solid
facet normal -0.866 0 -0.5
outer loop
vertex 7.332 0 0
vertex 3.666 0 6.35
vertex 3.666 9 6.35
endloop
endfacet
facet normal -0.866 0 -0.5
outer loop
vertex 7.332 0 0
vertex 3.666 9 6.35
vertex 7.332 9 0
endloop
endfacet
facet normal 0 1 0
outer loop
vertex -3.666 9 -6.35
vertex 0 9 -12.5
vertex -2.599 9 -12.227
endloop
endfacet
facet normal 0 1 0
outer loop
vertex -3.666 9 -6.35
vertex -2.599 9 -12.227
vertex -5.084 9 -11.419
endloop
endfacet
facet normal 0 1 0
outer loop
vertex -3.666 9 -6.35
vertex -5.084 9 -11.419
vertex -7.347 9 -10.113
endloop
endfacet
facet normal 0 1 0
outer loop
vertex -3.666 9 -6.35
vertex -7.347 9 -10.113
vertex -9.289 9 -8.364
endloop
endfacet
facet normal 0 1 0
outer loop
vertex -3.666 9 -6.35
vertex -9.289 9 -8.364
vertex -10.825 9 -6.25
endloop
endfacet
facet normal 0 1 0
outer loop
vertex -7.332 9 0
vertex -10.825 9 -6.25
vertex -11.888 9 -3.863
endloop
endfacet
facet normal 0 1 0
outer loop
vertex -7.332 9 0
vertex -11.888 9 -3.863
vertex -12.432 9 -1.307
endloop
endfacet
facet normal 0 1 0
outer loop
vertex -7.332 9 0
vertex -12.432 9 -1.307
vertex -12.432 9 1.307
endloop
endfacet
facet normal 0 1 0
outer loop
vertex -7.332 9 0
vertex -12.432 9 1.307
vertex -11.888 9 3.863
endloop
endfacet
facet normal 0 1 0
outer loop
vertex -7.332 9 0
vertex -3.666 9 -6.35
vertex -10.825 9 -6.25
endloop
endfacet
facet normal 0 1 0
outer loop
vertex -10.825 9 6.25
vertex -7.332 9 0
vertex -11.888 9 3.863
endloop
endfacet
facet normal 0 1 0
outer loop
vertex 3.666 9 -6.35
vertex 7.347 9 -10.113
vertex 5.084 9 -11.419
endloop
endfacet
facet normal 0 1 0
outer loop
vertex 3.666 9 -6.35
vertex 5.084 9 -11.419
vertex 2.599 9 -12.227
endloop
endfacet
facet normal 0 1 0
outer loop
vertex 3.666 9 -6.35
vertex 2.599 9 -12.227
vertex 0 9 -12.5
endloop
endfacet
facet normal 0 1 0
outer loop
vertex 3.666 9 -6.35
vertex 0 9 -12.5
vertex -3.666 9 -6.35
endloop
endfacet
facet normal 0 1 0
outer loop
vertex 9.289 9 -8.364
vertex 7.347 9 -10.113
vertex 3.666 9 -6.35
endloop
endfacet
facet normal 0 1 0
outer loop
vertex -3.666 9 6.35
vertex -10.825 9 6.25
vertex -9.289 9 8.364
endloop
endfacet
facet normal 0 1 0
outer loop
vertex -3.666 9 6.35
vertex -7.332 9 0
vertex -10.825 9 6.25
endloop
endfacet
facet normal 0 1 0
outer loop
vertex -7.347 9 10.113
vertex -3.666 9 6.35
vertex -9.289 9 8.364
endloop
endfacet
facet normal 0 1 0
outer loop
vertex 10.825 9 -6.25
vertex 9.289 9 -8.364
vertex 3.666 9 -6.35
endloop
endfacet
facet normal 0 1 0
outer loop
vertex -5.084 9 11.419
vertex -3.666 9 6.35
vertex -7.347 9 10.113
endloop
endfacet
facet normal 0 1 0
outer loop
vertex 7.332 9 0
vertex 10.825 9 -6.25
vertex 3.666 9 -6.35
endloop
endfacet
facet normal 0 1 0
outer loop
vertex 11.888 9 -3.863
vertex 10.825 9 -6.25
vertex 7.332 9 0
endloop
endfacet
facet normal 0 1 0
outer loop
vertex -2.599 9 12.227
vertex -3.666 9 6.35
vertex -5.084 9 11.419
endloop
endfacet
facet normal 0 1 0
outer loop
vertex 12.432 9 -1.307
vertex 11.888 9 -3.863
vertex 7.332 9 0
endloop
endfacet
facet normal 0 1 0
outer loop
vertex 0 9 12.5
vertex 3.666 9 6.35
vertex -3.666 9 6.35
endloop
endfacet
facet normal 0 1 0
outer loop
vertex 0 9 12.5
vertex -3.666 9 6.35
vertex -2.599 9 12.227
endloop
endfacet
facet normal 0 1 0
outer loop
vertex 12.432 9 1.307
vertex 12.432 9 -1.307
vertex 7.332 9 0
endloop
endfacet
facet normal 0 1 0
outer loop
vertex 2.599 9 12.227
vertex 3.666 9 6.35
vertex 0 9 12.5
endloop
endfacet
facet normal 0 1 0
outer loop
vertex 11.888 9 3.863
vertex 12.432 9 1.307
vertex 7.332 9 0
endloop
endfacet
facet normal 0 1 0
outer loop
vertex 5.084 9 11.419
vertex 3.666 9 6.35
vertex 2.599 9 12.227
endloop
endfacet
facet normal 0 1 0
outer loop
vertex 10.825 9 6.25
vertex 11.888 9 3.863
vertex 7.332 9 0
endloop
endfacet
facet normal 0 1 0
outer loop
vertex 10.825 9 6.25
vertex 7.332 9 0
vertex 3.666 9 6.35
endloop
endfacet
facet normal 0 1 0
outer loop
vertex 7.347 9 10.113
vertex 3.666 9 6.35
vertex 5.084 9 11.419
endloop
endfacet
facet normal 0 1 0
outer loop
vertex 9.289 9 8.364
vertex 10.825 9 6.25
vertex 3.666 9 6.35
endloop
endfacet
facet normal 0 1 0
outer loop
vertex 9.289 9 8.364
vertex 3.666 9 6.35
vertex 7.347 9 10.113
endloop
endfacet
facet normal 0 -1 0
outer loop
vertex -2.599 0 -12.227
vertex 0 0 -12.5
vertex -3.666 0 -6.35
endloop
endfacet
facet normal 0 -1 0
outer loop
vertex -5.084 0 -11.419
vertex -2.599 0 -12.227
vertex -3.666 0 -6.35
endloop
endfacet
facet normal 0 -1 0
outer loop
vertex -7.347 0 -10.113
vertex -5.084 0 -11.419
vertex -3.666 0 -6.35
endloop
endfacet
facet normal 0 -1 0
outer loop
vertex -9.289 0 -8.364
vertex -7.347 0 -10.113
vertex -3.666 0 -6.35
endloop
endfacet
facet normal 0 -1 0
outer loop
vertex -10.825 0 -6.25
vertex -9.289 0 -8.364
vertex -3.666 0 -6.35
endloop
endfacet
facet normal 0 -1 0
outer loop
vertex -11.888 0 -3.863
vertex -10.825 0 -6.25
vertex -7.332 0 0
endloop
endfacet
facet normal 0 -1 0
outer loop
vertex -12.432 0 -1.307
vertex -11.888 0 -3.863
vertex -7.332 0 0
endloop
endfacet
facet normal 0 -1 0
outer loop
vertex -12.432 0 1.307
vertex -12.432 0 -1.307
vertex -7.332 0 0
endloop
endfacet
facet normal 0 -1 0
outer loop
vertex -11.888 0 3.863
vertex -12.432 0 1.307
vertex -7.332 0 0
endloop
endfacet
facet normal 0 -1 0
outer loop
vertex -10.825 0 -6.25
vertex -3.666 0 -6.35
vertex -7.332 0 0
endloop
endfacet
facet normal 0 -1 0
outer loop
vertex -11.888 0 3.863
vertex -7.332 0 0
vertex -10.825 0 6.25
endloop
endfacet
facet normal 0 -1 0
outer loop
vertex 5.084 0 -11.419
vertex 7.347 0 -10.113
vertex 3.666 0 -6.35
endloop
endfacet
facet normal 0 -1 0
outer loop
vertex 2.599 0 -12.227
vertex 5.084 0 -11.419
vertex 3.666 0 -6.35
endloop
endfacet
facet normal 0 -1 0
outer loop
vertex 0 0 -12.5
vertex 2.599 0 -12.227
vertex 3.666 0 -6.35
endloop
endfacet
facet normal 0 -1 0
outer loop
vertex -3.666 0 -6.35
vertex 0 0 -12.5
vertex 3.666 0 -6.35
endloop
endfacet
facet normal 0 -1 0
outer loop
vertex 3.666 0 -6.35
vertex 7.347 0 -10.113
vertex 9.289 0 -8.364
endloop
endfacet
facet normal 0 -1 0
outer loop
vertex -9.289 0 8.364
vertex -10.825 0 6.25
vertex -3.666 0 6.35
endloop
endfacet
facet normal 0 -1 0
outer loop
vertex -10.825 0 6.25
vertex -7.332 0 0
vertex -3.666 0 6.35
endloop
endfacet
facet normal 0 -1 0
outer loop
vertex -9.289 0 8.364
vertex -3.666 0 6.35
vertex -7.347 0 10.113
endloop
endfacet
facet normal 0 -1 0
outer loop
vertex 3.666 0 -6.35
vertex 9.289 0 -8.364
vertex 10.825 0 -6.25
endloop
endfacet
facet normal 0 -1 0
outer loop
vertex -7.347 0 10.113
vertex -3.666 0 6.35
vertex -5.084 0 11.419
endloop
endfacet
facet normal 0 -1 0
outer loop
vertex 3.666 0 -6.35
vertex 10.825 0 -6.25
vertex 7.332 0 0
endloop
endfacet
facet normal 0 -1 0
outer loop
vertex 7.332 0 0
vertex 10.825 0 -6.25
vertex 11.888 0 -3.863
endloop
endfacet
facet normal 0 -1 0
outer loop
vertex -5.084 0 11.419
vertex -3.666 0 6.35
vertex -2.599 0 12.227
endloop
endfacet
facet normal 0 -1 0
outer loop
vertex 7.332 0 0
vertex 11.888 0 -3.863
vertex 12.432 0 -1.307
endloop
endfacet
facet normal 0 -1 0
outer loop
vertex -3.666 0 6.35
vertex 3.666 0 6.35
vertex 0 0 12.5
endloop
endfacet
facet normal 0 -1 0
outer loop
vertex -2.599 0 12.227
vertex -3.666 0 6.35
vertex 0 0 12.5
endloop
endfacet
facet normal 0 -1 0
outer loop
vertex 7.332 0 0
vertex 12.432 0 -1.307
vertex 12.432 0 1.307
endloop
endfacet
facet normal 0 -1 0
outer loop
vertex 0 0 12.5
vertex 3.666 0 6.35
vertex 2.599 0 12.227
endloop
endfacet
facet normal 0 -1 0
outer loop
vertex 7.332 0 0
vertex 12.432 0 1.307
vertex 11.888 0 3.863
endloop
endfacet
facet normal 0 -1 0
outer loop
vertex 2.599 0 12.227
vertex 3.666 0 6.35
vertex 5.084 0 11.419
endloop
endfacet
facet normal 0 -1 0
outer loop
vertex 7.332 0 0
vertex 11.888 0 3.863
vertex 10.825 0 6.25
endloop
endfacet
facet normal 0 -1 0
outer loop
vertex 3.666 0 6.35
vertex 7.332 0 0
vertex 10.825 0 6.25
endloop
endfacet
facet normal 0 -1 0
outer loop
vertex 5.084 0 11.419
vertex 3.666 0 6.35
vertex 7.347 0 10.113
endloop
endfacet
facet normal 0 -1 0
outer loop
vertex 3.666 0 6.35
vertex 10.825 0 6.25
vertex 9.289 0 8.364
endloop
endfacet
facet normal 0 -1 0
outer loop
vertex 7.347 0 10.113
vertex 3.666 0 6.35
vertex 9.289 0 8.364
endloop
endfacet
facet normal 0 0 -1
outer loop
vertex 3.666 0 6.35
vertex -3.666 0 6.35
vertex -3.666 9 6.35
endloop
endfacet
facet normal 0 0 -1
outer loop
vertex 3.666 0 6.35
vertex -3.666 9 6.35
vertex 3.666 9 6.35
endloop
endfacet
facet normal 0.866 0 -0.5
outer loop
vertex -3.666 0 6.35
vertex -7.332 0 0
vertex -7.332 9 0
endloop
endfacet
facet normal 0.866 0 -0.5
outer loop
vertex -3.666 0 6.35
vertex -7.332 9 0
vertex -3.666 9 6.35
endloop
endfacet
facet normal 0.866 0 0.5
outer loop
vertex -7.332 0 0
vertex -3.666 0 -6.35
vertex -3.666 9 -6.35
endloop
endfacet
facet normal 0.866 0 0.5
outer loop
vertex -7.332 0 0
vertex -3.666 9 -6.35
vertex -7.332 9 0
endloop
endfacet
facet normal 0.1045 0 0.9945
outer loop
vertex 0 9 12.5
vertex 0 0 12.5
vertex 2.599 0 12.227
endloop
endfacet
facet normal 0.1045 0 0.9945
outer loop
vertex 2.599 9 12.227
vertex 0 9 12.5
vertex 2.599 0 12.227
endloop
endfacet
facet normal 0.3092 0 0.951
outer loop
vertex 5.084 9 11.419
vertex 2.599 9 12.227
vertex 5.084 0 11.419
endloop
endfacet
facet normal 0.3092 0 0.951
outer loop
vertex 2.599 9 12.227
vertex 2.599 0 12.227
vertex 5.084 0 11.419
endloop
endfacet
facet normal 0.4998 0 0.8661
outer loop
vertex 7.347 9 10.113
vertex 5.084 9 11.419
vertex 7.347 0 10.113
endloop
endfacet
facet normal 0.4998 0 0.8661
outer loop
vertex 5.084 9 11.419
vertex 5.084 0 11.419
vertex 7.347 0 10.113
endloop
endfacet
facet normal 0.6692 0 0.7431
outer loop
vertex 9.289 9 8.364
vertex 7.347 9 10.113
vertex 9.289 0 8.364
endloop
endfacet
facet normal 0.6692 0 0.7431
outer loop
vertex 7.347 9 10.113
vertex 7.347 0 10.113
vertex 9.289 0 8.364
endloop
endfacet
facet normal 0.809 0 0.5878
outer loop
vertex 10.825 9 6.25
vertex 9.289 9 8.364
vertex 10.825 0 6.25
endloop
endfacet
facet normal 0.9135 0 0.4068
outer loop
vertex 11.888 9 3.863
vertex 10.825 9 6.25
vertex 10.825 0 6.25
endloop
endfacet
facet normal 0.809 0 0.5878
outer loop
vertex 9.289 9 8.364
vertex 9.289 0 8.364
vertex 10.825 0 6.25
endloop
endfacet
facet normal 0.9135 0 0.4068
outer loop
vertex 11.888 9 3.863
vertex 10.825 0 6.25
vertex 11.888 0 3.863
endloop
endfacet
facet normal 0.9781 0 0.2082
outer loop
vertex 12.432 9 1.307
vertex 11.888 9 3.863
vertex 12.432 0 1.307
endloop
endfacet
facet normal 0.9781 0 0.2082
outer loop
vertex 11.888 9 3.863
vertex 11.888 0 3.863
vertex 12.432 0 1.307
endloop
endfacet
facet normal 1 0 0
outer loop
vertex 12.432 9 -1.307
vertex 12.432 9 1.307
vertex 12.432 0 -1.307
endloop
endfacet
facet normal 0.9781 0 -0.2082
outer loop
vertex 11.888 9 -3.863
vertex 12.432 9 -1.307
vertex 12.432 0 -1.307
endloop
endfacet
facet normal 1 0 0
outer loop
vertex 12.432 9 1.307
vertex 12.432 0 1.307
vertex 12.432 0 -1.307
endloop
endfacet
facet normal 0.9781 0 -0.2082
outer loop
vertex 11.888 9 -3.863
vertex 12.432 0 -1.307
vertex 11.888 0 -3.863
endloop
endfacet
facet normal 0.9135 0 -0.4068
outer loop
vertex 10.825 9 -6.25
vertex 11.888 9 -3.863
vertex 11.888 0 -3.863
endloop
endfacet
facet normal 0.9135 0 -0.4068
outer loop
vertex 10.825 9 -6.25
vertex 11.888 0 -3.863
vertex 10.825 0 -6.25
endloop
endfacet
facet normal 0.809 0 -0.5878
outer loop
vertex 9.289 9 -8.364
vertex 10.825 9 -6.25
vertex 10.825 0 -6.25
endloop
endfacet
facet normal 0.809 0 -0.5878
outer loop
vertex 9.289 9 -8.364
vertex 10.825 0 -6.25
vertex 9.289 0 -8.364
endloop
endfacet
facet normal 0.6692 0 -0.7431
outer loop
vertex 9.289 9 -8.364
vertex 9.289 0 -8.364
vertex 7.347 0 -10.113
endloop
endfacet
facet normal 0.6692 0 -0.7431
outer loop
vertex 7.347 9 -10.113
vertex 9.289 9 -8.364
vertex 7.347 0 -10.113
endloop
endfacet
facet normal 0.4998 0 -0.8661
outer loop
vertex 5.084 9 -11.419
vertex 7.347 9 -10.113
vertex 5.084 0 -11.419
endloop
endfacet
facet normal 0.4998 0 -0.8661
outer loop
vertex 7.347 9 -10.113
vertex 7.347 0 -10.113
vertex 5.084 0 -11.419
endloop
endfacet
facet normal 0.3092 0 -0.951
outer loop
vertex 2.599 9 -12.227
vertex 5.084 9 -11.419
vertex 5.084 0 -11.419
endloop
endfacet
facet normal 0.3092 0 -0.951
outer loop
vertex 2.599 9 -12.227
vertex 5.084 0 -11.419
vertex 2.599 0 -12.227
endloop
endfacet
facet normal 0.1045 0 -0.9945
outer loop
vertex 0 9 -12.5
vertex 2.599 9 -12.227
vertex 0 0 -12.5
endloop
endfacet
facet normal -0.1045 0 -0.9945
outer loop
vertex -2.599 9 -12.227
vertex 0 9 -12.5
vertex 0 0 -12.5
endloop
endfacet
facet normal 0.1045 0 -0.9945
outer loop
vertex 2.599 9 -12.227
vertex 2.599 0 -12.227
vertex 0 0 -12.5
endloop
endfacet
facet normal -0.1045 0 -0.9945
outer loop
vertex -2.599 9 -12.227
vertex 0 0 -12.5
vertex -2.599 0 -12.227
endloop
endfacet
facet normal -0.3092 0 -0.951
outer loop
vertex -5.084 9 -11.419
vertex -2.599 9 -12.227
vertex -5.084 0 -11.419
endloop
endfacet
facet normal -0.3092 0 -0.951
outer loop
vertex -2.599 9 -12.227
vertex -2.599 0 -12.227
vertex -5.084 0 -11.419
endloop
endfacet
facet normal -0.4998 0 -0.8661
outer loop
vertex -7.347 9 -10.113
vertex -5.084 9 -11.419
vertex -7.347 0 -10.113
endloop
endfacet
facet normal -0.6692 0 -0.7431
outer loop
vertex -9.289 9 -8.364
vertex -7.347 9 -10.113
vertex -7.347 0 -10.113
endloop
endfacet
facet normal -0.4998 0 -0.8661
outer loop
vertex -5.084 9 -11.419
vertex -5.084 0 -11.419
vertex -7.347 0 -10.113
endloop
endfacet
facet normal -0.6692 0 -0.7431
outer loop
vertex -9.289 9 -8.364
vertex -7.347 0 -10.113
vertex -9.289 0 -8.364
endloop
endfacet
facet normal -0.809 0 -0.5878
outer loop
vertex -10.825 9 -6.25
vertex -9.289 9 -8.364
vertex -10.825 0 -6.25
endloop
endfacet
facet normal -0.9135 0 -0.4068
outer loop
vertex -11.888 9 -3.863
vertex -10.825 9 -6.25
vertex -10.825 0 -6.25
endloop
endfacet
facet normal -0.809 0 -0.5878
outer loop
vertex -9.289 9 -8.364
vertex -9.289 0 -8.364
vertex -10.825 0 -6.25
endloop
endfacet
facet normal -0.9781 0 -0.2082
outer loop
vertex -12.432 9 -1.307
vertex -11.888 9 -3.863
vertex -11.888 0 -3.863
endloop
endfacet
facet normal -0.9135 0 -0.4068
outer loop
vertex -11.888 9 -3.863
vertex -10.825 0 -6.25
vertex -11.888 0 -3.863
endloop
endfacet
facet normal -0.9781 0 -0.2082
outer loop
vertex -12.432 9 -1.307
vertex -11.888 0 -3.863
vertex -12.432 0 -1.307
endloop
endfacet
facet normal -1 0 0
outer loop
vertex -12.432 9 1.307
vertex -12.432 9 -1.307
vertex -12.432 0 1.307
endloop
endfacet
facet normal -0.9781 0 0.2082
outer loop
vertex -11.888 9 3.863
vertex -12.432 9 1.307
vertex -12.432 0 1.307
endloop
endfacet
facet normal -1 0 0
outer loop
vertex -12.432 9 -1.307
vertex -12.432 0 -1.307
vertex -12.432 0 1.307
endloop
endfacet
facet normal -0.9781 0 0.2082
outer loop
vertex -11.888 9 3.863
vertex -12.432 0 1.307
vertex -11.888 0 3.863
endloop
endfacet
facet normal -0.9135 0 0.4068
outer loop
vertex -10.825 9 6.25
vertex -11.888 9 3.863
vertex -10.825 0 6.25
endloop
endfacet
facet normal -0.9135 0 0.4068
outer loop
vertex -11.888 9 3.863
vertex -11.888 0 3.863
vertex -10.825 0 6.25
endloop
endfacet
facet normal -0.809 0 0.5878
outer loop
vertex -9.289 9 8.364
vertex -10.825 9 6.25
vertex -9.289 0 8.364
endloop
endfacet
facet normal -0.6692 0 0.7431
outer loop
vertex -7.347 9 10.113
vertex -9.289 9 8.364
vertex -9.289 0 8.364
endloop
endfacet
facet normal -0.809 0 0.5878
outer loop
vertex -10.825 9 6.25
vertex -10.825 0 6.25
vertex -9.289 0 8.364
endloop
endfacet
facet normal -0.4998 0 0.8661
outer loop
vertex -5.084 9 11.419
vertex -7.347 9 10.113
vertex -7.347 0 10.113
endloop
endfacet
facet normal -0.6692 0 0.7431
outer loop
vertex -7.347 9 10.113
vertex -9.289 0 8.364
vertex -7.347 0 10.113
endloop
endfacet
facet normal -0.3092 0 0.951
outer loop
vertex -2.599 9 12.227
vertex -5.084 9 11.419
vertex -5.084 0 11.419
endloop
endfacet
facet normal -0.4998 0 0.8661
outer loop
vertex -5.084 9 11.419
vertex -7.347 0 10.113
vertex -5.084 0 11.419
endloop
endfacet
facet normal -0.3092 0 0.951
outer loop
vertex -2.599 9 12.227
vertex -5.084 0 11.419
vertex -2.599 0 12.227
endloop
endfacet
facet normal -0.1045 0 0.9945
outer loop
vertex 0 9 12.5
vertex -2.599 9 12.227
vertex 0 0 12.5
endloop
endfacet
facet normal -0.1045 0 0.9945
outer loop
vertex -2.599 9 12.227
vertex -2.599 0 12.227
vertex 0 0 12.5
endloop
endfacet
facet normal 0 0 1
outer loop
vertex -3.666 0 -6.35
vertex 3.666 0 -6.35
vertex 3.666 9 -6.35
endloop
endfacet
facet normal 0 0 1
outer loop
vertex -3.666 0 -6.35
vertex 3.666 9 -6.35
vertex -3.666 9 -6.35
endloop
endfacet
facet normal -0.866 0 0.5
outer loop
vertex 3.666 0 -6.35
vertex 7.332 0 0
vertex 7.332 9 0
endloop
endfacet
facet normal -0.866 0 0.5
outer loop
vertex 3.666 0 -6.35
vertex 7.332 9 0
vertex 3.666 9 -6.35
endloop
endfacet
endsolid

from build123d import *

# Parameters (mm, degrees)
CROQUIS1_R              = 12.5
SALIENTE_EXTRUIR1_DEPTH = 9


with BuildPart() as part:
    # Croquis1 → Saliente-Extruir1 (new body)
    with BuildSketch(Plane(origin=(0, 0, 0), x_dir=(1, 0, 0), z_dir=(0, 1, 0))):
        with Locations(Location((0, 0, 0), (0, 0, 270))):
            Circle(CROQUIS1_R)
        Polygon((7.332348419, 0), (3.666174209, 6.35), (-3.666174209, 6.35), (-7.332348419, 0), (-3.666174209, -6.35), (3.666174209, -6.35), align=None, mode=Mode.SUBTRACT)
    extrude(amount=SALIENTE_EXTRUIR1_DEPTH)


solid = part.part
